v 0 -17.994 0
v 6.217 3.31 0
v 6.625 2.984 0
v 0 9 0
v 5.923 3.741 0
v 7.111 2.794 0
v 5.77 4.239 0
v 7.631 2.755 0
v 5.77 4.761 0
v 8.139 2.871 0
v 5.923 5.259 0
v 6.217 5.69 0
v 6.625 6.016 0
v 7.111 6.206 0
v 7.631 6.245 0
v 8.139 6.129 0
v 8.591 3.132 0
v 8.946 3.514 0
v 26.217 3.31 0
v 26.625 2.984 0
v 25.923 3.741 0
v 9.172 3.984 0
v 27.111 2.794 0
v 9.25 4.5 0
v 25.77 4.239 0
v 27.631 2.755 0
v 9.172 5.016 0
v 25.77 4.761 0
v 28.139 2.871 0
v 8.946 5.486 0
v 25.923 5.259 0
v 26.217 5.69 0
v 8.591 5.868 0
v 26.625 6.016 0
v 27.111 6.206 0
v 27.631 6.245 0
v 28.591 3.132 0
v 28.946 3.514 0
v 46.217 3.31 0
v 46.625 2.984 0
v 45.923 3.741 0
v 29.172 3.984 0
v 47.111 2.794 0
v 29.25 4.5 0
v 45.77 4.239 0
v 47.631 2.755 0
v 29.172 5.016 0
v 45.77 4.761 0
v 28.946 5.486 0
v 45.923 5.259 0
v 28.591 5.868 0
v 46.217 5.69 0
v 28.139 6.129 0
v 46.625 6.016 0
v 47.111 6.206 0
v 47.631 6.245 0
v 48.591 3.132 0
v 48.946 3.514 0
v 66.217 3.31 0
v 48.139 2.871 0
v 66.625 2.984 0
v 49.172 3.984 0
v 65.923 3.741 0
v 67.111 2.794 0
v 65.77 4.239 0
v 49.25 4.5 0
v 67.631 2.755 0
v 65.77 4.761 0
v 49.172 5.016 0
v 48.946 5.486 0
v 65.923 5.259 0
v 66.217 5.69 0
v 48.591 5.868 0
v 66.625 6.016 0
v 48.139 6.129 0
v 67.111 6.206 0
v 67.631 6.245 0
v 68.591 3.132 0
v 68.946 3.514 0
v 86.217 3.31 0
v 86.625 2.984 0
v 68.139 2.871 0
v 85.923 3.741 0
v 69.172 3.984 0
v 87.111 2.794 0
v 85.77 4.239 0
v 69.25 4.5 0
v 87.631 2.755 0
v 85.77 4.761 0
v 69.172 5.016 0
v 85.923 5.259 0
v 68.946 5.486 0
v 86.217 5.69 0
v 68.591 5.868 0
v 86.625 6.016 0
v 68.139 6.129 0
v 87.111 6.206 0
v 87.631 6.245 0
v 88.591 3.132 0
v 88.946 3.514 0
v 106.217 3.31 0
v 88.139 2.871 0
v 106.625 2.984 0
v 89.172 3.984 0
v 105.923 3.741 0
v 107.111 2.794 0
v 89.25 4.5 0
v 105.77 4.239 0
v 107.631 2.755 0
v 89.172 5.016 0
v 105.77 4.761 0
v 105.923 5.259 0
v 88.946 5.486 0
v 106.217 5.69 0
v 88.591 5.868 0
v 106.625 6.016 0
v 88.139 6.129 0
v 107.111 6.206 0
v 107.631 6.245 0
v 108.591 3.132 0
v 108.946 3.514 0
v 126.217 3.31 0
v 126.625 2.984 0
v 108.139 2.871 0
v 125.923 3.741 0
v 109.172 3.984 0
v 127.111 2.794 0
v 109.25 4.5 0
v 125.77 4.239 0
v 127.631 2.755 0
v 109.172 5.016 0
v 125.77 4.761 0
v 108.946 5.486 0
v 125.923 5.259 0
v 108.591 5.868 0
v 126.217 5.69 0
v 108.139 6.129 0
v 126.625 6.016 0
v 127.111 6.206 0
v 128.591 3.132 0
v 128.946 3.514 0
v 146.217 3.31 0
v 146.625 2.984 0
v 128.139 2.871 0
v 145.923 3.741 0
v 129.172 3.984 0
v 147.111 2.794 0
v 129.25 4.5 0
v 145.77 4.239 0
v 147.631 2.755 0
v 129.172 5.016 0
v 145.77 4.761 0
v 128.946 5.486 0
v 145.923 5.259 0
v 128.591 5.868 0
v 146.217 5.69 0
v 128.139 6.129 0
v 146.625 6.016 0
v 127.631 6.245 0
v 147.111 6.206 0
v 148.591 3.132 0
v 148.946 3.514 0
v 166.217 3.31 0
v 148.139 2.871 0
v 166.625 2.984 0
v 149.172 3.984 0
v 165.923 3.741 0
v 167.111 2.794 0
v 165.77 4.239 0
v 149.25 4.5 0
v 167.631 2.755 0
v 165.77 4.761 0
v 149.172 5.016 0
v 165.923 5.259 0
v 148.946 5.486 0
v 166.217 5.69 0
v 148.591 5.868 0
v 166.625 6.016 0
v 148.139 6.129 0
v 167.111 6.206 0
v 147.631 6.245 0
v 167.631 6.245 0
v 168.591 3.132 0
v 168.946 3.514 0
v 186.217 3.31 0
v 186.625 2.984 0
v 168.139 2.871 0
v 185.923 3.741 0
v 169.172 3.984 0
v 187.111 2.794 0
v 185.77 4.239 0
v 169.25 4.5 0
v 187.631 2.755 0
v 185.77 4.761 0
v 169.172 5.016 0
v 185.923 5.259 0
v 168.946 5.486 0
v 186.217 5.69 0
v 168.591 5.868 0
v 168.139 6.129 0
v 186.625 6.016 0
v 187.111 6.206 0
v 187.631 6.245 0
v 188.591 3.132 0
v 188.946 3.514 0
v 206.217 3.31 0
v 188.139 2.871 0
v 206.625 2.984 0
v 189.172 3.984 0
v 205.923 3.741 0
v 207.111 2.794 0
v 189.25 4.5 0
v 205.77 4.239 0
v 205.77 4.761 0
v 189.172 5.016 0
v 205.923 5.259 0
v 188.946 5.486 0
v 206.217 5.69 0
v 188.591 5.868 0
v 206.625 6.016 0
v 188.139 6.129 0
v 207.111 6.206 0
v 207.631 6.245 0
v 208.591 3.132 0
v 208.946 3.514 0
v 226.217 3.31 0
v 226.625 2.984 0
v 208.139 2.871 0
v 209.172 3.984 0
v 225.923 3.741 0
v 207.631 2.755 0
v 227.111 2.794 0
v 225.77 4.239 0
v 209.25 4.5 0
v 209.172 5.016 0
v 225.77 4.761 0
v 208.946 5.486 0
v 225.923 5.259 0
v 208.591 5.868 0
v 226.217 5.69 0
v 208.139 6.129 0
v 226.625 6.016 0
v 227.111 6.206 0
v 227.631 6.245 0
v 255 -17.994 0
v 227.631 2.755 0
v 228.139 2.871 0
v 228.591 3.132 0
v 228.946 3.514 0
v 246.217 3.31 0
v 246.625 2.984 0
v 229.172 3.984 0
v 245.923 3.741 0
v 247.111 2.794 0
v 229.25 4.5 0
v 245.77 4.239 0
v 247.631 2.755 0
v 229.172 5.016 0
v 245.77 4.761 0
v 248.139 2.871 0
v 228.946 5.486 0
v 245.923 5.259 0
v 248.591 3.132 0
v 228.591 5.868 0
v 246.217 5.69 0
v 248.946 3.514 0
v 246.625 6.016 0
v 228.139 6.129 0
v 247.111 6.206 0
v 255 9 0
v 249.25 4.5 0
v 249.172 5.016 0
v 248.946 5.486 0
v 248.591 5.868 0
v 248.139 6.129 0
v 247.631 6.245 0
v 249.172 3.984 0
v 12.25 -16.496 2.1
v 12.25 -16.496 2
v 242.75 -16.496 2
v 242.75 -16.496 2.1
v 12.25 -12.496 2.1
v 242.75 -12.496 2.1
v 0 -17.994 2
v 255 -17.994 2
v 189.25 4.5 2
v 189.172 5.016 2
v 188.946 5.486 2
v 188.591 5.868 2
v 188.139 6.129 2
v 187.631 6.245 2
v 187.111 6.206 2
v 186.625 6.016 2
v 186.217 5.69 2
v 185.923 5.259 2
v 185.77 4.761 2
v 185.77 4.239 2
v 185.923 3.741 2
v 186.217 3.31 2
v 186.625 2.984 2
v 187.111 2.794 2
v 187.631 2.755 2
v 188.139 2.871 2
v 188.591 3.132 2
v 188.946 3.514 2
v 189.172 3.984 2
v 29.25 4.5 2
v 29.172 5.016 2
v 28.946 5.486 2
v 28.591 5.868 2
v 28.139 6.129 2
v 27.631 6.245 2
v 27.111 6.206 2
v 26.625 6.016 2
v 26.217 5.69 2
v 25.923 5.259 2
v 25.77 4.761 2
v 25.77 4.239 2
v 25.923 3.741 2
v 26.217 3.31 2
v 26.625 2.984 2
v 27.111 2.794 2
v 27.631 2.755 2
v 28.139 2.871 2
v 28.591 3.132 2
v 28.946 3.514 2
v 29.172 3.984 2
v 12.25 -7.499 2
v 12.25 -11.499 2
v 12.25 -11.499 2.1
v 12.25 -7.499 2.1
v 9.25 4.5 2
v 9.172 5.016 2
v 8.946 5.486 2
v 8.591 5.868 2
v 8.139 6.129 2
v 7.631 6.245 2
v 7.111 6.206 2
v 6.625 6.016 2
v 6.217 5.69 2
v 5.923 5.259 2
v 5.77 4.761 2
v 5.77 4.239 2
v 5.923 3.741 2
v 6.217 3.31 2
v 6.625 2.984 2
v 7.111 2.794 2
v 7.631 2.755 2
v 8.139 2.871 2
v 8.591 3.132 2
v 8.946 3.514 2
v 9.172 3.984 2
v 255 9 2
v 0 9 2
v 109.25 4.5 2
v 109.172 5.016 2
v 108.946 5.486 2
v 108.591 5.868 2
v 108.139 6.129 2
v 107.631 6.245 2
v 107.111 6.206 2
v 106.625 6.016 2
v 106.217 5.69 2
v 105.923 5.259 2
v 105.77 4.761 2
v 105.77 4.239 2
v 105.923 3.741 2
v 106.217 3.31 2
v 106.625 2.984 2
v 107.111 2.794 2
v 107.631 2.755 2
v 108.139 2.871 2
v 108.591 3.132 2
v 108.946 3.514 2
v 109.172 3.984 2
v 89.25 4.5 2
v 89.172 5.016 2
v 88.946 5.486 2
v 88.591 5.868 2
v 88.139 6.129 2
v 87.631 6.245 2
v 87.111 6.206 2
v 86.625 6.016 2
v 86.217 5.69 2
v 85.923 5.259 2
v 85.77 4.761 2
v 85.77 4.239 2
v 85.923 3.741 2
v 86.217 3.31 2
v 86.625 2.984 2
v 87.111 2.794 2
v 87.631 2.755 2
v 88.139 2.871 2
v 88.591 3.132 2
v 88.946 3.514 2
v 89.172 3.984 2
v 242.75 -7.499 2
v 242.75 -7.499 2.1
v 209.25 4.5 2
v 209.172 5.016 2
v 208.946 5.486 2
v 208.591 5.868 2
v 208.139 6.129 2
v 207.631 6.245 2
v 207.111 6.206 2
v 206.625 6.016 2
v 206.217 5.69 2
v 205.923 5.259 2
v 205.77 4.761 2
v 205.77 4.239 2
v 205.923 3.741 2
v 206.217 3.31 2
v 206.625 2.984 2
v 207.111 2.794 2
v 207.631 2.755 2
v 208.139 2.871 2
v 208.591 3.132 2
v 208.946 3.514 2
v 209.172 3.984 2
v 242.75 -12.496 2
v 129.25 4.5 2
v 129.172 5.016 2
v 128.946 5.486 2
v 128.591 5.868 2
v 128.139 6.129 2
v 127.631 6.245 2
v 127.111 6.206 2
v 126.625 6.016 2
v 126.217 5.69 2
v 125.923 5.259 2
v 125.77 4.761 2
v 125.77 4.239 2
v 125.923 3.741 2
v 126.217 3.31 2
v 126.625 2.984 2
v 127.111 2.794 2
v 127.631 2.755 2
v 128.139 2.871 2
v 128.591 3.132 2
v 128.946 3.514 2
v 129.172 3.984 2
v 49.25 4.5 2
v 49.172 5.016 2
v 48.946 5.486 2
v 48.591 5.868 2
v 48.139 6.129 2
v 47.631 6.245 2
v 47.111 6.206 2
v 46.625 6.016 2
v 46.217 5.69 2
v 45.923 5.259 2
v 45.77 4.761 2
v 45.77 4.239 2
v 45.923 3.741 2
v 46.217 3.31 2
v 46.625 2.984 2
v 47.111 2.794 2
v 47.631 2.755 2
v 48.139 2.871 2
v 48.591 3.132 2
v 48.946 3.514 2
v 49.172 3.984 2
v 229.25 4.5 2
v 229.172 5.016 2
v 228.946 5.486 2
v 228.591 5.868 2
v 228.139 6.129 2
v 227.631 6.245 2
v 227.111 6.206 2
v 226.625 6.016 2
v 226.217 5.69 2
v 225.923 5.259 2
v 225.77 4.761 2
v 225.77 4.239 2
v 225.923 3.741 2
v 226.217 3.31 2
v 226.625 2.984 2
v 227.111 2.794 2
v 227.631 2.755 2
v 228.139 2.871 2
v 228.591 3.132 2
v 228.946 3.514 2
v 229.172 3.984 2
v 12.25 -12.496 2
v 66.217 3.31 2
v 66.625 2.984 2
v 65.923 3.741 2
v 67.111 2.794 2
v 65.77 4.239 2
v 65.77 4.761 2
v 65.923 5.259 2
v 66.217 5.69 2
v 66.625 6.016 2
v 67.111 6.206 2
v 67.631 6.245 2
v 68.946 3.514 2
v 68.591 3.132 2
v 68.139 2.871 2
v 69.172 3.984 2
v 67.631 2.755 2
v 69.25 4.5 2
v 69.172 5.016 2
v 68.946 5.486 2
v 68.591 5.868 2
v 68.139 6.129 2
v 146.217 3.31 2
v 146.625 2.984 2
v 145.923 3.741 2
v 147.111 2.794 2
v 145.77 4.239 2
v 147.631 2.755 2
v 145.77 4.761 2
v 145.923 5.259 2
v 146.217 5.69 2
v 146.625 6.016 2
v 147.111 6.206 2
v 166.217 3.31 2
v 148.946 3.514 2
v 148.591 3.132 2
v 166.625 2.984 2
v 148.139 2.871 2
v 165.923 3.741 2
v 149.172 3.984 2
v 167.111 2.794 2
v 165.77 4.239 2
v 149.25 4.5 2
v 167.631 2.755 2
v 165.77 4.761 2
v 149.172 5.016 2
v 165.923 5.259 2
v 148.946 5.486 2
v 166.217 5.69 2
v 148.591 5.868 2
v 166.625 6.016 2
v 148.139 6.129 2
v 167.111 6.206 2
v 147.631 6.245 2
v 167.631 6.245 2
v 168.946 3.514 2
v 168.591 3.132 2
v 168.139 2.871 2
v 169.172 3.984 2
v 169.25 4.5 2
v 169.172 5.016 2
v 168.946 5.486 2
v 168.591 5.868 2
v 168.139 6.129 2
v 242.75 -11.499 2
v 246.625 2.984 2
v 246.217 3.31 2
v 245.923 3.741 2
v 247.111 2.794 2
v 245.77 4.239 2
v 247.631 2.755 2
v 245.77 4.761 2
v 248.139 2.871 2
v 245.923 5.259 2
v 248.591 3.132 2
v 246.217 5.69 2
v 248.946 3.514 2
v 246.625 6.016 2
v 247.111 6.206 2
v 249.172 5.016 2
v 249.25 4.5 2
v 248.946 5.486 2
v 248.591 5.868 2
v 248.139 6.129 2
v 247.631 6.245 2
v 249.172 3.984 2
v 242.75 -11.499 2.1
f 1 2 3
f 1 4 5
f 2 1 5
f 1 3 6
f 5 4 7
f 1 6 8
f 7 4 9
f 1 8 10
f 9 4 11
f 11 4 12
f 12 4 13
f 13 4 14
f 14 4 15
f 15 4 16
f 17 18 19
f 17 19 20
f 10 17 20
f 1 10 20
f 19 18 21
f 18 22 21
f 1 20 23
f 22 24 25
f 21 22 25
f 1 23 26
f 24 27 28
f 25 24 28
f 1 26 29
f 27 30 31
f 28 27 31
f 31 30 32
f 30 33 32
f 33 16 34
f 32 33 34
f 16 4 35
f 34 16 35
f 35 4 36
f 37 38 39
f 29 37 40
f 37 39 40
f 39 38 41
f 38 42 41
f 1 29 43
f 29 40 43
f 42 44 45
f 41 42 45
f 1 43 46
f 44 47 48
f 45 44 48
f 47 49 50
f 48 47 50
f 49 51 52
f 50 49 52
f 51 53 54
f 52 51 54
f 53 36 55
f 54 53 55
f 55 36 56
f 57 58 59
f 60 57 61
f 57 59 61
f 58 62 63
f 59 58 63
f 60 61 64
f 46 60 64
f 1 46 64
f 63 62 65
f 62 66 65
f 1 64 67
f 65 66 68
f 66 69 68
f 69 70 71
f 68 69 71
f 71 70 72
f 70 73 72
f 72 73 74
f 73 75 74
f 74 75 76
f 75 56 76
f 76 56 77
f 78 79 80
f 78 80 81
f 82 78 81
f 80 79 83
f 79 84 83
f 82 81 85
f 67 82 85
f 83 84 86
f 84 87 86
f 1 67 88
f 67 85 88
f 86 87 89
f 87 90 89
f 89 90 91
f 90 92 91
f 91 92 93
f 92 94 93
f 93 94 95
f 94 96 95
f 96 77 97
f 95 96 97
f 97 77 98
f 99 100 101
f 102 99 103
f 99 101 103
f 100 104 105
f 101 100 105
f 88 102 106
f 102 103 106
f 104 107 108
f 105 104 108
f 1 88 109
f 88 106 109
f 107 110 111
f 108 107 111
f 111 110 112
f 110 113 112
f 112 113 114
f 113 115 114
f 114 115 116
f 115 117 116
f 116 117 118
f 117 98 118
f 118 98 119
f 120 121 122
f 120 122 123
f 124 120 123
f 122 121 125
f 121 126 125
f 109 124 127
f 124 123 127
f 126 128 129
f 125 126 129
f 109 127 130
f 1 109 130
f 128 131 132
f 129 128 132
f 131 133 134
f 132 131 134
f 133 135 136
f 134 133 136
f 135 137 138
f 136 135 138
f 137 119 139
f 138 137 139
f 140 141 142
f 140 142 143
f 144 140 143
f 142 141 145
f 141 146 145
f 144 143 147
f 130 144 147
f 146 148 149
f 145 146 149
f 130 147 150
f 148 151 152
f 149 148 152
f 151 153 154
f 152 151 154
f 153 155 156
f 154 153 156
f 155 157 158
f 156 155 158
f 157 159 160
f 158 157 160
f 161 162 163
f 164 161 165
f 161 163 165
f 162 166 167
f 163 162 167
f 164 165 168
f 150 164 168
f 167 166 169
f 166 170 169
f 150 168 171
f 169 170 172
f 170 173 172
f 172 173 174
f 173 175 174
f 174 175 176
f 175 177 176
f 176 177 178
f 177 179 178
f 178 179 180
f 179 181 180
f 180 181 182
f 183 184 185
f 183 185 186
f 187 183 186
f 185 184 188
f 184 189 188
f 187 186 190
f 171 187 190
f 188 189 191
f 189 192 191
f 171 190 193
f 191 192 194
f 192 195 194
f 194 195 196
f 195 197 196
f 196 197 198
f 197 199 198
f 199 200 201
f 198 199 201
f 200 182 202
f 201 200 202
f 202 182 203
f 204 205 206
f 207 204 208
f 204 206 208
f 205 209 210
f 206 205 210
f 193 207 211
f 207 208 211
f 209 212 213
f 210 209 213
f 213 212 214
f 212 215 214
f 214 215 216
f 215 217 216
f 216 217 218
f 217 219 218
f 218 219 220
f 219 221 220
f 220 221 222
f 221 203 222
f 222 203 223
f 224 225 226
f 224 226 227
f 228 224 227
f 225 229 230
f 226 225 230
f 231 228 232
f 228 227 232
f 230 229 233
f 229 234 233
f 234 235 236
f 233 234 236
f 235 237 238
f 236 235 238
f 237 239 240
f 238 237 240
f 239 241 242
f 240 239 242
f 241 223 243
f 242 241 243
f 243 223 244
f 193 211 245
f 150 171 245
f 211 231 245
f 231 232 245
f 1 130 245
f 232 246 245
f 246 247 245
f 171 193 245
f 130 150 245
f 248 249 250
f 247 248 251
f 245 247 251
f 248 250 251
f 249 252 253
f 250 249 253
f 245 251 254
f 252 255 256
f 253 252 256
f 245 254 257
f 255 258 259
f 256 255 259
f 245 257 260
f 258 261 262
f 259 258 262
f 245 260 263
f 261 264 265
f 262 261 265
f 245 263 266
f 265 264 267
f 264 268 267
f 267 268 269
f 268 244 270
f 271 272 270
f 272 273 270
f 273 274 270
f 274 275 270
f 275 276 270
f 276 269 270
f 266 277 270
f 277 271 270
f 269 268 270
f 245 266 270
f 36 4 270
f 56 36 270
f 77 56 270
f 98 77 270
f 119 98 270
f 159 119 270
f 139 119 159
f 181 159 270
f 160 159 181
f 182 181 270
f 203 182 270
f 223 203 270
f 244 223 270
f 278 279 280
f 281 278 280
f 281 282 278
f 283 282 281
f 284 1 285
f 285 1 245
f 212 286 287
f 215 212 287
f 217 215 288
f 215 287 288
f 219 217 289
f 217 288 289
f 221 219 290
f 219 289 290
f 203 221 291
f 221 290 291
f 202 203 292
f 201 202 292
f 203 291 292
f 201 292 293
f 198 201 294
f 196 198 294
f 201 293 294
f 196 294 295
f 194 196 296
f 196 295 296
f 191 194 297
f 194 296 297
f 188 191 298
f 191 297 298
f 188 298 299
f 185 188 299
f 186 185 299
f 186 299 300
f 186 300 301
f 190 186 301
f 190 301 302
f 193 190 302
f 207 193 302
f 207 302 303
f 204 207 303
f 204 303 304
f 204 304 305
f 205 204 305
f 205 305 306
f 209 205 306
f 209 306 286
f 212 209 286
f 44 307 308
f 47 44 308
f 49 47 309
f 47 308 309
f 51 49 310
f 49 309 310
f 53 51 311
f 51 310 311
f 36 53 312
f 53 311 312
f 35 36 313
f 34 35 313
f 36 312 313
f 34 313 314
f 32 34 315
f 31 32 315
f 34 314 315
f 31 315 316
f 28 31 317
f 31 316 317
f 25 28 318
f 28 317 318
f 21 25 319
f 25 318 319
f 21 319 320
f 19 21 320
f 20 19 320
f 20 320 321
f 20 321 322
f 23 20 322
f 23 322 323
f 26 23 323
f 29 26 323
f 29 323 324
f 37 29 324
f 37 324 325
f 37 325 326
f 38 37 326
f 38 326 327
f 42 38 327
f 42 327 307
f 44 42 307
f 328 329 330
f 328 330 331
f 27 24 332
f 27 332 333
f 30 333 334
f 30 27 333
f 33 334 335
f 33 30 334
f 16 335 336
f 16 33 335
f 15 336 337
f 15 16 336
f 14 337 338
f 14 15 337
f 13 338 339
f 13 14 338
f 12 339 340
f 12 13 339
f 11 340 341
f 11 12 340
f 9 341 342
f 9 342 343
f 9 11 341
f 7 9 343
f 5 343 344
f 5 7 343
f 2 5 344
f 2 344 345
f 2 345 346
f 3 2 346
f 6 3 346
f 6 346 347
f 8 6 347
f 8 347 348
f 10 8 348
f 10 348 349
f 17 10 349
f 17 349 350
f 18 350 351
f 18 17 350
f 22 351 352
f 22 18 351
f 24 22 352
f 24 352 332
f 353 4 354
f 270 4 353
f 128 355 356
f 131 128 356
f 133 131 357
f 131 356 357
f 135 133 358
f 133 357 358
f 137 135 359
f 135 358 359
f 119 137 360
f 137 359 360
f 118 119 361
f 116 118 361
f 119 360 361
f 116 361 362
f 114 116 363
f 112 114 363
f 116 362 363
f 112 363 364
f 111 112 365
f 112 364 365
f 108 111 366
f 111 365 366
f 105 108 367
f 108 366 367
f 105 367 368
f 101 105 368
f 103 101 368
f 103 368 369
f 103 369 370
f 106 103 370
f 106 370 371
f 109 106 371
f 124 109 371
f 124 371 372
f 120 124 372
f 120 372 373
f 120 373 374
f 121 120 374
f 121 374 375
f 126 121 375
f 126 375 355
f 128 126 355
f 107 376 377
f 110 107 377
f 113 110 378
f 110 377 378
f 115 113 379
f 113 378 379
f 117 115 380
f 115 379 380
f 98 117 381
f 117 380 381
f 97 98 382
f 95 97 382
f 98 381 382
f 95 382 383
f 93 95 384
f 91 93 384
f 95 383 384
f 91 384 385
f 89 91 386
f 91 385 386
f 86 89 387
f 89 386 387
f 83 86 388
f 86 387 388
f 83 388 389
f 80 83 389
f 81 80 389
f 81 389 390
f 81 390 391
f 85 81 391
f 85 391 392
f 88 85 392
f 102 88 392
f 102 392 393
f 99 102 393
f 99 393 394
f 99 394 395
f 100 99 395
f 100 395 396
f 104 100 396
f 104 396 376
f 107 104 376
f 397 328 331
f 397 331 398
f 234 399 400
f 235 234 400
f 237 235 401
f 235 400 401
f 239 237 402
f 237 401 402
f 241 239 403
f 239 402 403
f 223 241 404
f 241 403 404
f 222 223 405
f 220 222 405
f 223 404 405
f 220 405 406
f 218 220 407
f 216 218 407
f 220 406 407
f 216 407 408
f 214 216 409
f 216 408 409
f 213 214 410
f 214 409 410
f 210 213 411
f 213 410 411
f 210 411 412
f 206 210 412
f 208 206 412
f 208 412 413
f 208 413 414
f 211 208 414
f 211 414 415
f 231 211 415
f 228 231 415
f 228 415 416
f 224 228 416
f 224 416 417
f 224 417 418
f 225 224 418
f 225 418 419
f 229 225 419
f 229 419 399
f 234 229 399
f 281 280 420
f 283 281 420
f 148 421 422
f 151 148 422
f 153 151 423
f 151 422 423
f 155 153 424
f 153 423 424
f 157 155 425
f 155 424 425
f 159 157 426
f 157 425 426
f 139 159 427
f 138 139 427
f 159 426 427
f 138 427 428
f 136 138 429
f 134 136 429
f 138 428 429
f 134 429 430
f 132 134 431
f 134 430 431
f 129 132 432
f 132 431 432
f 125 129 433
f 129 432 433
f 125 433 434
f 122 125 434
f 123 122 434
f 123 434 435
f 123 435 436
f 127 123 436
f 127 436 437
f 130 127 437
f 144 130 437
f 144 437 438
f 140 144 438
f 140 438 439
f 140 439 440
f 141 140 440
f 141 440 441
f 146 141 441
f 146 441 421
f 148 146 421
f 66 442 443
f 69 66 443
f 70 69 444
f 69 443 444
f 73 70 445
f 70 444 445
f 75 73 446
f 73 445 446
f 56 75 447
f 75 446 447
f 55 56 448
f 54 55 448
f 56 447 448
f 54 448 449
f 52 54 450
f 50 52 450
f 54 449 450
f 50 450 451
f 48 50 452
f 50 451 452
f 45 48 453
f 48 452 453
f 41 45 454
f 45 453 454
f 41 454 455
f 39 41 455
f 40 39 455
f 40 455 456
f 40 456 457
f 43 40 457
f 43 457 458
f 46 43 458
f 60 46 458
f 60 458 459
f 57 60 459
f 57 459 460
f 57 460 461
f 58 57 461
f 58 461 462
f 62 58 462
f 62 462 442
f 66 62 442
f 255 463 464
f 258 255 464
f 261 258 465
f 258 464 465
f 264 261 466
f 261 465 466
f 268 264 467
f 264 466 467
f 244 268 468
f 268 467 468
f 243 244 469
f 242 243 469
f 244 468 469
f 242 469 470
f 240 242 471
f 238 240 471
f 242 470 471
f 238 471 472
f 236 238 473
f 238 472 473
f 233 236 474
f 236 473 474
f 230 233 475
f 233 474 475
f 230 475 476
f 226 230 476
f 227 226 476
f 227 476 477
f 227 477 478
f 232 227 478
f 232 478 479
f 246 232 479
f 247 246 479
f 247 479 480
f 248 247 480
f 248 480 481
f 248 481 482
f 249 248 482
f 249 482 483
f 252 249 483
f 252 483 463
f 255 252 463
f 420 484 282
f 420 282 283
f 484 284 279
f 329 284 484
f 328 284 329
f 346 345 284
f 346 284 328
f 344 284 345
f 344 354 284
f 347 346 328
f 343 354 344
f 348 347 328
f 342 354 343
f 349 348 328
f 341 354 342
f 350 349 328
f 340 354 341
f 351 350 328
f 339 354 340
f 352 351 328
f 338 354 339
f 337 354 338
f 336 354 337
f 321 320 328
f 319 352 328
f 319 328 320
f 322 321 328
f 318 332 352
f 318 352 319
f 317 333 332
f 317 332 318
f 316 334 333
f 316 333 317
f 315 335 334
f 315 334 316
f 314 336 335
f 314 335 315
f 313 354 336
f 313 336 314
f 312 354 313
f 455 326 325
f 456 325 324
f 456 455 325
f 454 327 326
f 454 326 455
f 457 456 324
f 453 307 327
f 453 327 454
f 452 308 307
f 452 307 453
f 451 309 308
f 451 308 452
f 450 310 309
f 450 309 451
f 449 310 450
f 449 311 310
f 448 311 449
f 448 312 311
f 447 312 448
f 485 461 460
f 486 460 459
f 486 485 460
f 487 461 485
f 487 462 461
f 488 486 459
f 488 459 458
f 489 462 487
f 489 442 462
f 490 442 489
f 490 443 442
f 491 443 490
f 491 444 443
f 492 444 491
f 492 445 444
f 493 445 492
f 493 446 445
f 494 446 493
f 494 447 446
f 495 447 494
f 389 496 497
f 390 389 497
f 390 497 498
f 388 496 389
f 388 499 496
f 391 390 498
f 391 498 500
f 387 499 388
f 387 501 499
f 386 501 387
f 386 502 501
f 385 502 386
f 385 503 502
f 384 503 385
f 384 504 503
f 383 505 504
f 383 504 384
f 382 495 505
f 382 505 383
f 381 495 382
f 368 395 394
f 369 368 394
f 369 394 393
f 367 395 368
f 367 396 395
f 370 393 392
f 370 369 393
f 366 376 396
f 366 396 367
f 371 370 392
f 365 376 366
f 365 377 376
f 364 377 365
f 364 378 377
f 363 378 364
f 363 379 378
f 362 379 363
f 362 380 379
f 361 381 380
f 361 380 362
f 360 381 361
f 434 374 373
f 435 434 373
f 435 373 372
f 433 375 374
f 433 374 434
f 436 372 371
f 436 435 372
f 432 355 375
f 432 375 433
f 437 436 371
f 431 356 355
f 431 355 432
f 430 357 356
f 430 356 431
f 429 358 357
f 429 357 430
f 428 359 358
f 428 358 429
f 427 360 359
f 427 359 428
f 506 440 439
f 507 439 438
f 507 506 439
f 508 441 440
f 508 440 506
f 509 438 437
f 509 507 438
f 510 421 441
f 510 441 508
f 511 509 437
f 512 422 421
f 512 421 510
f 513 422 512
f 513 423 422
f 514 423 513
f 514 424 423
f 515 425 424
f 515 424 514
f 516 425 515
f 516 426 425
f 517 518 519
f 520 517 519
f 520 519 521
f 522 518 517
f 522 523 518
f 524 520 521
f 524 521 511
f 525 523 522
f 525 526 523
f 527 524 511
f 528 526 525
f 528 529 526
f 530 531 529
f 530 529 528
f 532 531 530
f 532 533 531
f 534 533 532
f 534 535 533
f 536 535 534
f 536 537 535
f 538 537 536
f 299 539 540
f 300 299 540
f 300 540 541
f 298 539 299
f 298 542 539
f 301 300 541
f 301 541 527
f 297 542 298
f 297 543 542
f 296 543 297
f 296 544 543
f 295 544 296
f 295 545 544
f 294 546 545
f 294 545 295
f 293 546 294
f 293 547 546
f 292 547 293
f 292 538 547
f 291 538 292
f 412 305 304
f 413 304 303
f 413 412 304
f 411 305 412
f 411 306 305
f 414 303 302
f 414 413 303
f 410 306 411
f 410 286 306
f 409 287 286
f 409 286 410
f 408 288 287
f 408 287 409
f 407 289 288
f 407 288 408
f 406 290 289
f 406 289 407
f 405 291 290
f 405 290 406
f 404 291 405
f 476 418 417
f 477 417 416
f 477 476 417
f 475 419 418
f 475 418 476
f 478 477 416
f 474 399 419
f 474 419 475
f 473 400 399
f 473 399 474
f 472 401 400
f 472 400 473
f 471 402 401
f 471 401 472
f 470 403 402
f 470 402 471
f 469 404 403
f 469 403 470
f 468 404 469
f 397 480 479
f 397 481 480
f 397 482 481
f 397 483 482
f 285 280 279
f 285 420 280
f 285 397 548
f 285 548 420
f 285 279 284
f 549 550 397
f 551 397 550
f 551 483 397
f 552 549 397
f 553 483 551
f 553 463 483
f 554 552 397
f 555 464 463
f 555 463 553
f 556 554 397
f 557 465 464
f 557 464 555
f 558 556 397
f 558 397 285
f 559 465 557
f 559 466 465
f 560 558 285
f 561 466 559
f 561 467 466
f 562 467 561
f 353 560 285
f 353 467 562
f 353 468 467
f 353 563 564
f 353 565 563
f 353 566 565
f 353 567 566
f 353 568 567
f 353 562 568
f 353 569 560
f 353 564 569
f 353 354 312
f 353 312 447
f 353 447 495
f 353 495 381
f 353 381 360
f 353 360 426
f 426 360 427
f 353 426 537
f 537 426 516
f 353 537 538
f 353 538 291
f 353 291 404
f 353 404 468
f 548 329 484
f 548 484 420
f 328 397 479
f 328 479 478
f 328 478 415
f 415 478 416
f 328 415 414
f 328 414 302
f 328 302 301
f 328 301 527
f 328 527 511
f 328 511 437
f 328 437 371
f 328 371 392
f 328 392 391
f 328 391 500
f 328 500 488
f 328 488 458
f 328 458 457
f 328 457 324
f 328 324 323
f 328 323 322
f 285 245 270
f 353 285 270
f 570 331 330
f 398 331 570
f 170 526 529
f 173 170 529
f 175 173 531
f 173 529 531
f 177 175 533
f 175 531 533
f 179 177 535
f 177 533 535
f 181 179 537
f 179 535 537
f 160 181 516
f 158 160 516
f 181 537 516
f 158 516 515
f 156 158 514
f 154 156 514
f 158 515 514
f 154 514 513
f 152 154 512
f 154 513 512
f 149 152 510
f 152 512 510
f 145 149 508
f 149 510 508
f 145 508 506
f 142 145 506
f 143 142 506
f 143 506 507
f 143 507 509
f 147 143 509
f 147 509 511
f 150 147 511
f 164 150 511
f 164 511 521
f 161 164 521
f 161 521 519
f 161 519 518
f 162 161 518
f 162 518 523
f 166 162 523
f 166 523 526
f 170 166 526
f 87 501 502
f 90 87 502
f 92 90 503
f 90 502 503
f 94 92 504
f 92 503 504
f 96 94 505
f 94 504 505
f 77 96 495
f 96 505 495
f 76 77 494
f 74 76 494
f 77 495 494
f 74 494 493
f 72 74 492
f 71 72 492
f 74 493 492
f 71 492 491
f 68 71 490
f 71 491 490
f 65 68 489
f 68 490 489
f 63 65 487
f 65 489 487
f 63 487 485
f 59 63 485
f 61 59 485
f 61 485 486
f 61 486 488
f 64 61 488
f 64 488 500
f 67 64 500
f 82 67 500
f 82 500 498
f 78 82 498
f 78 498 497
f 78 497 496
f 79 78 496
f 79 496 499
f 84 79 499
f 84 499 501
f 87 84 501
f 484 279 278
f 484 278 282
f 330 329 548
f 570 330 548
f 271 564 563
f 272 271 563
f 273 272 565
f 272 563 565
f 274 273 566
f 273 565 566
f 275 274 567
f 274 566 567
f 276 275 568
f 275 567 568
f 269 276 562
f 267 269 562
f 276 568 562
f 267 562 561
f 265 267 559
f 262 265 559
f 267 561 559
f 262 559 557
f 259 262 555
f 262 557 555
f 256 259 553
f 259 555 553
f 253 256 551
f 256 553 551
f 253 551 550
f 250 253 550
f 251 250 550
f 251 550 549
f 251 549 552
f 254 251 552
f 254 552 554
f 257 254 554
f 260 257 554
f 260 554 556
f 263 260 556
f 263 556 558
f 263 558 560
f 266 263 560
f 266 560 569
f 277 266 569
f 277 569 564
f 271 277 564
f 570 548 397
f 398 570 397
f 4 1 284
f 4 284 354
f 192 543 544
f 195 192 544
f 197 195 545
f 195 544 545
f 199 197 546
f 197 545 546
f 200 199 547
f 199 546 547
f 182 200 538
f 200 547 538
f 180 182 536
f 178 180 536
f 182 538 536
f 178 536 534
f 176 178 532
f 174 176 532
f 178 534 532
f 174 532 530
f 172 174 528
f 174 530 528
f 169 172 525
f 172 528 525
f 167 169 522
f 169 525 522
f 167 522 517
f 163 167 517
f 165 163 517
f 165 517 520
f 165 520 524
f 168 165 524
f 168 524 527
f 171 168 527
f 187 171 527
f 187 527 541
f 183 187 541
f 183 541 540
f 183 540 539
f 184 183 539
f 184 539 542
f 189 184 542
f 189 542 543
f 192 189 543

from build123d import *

# Parameters (mm, degrees)
SKETCH_W            = 255
SKETCH_H            = 26.9944
SKETCH_R            = 1.75
PAD_DEPTH           = 2
SKETCH001_R         = 1.75
POCKET_DEPTH        = 2.001
LINEARPATTERN_COUNT = 13
LINEARPATTERN_PITCH = 20
SKETCH002_W         = 230.5
SKETCH002_H         = 4
PAD001_DEPTH        = 0.1


with BuildPart() as part:
    # Sketch → Pad (new body)
    with BuildSketch(Plane.XY):
        with Locations((127.5, -4.4972)):
            Rectangle(SKETCH_W, SKETCH_H)
        with Locations((7.5, 4.5)):
            Circle(SKETCH_R, mode=Mode.SUBTRACT)
    extrude(amount=PAD_DEPTH)

    # Sketch001 (on Face7 of Pad) → Pocket (cut, through all)
    with BuildSketch(Plane.XY.offset(2)):
        with Locations((7.5, 4.5)):
            Circle(SKETCH001_R)
    pocket = extrude(amount=-POCKET_DEPTH, mode=Mode.SUBTRACT)

    # LinearPattern: Pocket ×13
    with Locations(*[(i * LINEARPATTERN_PITCH, 0, 0) for i in range(1, LINEARPATTERN_COUNT)]):
        add(pocket, mode=Mode.SUBTRACT)

    # Sketch002 (on Face5 of LinearPattern) → Pad001 (join)
    with BuildSketch(Plane.XY.offset(2)):
        with Locations((127.5, -9.4986)):
            Rectangle(SKETCH002_W, SKETCH002_H)
        with Locations((127.5, -14.4958)):
            Rectangle(SKETCH002_W, SKETCH002_H)
    extrude(amount=PAD001_DEPTH)


solid = part.part
